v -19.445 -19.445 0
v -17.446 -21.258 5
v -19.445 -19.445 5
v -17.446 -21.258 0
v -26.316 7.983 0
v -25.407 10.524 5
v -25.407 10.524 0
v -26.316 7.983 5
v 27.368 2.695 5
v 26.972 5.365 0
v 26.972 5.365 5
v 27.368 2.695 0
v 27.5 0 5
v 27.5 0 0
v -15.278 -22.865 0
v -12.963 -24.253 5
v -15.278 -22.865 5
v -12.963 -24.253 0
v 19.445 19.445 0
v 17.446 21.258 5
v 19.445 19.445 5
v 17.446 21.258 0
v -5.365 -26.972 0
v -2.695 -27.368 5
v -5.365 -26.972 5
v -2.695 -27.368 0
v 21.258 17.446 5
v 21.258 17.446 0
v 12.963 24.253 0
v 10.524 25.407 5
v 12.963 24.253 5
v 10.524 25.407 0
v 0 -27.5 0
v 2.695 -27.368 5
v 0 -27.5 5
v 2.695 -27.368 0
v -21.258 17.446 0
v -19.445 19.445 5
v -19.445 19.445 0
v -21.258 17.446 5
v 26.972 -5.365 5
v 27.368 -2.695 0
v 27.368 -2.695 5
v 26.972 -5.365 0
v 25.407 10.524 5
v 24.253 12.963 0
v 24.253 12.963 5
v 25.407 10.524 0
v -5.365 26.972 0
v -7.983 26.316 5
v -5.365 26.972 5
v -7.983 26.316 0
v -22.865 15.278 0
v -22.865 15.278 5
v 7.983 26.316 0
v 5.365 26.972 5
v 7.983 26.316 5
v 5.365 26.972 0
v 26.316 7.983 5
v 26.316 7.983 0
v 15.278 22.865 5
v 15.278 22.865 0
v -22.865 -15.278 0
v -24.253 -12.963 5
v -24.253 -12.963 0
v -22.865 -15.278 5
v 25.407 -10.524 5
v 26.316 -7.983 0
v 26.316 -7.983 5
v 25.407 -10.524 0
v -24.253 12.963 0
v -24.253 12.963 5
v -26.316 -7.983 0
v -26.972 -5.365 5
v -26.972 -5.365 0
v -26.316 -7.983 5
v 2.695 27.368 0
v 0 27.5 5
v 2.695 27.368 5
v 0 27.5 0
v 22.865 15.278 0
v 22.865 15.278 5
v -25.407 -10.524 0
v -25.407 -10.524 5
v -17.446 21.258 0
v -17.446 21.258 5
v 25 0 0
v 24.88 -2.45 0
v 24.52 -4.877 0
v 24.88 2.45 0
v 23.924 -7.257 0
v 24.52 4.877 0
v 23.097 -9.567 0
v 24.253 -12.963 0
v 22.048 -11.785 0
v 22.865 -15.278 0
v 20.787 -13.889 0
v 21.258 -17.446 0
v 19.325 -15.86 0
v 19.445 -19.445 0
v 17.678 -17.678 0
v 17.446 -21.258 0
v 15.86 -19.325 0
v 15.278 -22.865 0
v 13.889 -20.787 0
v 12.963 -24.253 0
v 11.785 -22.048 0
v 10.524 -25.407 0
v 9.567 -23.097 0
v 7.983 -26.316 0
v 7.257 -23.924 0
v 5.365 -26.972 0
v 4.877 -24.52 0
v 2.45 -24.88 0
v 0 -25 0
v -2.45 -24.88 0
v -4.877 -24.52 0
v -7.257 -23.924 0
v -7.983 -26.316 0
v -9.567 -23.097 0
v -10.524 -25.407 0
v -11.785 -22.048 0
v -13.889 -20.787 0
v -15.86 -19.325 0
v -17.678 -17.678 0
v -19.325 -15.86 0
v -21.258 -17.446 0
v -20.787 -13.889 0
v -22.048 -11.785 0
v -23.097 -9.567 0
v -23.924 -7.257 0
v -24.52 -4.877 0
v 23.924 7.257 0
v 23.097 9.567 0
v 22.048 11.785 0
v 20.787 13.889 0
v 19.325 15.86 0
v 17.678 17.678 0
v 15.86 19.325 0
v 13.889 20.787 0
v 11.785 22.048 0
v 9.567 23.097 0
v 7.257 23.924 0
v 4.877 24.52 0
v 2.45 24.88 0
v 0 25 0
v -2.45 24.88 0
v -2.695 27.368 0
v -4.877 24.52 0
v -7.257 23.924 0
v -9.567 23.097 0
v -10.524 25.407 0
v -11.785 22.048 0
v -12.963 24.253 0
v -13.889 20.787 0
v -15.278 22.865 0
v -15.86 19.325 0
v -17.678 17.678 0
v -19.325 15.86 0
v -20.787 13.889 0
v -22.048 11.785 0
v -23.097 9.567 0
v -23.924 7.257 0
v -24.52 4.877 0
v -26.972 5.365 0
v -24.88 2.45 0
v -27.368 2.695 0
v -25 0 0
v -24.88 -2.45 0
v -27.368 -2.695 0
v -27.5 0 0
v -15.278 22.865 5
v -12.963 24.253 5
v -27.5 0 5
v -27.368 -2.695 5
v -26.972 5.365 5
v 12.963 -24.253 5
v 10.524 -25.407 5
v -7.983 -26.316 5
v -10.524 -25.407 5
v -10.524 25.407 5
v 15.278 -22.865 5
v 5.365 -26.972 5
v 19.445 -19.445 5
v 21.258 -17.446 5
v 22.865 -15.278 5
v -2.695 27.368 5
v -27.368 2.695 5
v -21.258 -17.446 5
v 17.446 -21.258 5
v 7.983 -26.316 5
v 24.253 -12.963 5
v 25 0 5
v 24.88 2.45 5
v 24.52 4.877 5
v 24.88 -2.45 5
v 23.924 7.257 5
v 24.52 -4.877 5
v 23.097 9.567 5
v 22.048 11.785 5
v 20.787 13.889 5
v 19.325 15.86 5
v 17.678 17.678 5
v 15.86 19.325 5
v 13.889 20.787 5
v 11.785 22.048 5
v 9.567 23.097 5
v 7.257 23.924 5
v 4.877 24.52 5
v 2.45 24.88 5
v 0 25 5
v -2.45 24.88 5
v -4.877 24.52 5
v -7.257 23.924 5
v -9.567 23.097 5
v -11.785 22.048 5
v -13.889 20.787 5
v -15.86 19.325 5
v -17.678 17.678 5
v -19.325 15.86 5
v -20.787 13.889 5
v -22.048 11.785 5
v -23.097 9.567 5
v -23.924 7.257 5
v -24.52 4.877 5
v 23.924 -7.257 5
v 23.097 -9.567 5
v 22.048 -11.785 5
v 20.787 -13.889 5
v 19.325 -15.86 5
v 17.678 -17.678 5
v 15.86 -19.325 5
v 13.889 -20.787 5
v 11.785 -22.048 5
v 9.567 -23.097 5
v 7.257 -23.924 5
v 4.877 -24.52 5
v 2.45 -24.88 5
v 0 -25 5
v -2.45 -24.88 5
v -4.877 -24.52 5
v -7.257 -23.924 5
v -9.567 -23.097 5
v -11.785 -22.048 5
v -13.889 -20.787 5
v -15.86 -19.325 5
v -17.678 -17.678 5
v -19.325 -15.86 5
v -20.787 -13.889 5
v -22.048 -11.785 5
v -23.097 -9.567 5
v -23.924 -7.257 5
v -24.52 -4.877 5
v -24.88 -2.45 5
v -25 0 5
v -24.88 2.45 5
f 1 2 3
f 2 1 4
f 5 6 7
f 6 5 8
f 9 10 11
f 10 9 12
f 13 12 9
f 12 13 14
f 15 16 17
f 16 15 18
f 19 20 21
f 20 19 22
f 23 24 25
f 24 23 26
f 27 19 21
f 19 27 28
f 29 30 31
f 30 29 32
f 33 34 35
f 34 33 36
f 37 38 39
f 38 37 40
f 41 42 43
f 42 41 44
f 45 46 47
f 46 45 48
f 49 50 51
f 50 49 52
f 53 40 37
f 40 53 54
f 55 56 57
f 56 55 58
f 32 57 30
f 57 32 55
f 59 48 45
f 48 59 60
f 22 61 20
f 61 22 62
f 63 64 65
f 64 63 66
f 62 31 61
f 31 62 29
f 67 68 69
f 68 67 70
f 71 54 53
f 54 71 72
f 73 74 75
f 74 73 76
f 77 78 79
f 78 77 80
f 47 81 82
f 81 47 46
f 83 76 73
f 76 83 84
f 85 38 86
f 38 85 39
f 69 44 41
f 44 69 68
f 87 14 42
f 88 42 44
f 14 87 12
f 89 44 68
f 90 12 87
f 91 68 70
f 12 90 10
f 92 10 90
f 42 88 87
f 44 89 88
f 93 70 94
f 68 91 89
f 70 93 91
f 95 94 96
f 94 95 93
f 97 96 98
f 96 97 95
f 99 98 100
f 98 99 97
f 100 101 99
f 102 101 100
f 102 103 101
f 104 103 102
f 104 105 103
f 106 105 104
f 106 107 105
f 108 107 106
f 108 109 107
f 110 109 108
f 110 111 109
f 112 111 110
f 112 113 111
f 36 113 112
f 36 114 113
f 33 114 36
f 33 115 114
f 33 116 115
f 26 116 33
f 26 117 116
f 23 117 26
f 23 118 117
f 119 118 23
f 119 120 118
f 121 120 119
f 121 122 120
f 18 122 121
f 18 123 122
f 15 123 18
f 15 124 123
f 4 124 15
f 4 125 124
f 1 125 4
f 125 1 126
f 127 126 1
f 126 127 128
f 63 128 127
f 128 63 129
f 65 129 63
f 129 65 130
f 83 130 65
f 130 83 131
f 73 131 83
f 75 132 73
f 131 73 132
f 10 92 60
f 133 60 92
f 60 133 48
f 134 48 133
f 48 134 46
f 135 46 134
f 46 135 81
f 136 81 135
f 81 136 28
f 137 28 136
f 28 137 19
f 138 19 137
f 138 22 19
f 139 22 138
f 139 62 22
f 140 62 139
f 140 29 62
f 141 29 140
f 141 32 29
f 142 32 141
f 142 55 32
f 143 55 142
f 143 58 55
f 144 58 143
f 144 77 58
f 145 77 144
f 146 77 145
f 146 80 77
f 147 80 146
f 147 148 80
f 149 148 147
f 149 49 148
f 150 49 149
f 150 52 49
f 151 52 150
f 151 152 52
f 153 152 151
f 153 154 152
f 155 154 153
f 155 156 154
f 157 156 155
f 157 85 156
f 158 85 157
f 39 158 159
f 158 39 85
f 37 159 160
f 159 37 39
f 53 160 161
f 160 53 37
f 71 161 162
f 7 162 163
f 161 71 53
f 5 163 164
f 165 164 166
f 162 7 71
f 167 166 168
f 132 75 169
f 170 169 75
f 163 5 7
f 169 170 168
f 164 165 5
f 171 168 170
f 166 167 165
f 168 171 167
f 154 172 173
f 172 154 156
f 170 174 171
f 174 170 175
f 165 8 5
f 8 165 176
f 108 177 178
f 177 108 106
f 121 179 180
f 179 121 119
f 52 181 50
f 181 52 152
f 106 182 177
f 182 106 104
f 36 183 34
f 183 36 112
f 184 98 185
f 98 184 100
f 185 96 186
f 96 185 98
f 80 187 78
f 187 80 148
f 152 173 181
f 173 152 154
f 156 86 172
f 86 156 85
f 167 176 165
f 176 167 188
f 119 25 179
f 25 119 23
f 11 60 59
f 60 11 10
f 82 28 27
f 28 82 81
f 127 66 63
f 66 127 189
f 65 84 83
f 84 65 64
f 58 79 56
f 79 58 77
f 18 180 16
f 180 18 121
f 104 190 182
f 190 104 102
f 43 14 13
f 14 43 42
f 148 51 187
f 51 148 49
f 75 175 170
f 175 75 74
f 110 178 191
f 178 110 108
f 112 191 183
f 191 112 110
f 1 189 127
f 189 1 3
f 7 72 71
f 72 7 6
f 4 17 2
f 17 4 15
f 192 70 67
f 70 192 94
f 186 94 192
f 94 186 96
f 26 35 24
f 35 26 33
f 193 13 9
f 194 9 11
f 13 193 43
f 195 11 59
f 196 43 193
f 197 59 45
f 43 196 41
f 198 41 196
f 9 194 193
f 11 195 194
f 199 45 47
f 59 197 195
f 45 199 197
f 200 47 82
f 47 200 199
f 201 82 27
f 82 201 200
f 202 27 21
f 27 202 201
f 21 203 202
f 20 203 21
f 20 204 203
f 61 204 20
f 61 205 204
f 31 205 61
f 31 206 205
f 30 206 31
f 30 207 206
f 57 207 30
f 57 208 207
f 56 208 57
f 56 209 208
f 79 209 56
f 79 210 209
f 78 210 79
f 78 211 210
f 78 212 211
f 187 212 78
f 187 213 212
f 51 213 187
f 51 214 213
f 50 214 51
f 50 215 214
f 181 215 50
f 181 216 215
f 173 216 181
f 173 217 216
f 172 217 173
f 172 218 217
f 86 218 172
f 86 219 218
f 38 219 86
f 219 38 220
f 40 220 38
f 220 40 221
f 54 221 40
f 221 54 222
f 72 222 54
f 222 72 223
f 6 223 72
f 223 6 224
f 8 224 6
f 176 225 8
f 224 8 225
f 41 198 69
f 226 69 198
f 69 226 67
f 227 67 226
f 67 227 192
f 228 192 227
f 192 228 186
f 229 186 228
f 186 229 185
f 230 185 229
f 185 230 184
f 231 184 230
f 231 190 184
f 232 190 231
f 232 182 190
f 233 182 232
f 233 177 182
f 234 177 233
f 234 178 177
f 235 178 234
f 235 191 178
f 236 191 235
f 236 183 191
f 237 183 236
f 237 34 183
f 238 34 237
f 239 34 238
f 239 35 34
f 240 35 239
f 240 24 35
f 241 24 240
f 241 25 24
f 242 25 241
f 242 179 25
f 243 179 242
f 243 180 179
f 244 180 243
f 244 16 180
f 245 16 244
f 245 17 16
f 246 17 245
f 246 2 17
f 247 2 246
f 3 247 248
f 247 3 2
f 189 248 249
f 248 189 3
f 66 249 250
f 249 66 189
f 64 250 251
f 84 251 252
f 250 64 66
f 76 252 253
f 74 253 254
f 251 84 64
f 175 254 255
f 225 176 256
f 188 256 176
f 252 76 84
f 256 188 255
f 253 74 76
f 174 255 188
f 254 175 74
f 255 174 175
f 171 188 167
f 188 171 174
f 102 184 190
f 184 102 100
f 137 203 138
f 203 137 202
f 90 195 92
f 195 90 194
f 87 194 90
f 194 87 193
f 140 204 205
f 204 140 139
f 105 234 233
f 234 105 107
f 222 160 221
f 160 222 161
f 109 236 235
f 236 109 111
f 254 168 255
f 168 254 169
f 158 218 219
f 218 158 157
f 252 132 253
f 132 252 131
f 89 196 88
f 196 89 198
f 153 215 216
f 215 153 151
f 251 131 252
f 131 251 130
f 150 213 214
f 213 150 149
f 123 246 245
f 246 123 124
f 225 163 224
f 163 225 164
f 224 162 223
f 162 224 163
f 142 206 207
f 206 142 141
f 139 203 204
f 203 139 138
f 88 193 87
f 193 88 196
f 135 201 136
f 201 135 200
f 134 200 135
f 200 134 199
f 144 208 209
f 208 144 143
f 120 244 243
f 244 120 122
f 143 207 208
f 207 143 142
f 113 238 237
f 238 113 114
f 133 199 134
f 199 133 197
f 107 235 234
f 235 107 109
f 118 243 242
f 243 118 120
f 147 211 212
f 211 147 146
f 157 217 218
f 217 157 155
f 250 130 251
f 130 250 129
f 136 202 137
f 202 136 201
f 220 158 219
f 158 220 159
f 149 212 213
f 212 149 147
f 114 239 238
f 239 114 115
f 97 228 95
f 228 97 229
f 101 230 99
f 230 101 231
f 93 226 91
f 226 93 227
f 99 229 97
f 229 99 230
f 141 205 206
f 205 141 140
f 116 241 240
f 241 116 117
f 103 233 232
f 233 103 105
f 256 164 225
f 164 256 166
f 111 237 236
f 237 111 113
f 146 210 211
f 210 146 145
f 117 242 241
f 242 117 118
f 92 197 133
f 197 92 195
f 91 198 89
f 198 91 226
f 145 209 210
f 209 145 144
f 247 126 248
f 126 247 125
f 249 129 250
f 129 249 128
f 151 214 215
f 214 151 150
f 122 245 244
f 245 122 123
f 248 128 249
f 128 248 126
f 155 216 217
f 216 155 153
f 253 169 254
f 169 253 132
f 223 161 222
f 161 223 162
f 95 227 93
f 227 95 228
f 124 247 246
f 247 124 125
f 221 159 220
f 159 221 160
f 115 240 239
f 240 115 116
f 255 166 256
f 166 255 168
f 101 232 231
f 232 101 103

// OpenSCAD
use <../nscad-lib.scad>

color("orange") ring(d = 55, thickness = 5, h = 5);
